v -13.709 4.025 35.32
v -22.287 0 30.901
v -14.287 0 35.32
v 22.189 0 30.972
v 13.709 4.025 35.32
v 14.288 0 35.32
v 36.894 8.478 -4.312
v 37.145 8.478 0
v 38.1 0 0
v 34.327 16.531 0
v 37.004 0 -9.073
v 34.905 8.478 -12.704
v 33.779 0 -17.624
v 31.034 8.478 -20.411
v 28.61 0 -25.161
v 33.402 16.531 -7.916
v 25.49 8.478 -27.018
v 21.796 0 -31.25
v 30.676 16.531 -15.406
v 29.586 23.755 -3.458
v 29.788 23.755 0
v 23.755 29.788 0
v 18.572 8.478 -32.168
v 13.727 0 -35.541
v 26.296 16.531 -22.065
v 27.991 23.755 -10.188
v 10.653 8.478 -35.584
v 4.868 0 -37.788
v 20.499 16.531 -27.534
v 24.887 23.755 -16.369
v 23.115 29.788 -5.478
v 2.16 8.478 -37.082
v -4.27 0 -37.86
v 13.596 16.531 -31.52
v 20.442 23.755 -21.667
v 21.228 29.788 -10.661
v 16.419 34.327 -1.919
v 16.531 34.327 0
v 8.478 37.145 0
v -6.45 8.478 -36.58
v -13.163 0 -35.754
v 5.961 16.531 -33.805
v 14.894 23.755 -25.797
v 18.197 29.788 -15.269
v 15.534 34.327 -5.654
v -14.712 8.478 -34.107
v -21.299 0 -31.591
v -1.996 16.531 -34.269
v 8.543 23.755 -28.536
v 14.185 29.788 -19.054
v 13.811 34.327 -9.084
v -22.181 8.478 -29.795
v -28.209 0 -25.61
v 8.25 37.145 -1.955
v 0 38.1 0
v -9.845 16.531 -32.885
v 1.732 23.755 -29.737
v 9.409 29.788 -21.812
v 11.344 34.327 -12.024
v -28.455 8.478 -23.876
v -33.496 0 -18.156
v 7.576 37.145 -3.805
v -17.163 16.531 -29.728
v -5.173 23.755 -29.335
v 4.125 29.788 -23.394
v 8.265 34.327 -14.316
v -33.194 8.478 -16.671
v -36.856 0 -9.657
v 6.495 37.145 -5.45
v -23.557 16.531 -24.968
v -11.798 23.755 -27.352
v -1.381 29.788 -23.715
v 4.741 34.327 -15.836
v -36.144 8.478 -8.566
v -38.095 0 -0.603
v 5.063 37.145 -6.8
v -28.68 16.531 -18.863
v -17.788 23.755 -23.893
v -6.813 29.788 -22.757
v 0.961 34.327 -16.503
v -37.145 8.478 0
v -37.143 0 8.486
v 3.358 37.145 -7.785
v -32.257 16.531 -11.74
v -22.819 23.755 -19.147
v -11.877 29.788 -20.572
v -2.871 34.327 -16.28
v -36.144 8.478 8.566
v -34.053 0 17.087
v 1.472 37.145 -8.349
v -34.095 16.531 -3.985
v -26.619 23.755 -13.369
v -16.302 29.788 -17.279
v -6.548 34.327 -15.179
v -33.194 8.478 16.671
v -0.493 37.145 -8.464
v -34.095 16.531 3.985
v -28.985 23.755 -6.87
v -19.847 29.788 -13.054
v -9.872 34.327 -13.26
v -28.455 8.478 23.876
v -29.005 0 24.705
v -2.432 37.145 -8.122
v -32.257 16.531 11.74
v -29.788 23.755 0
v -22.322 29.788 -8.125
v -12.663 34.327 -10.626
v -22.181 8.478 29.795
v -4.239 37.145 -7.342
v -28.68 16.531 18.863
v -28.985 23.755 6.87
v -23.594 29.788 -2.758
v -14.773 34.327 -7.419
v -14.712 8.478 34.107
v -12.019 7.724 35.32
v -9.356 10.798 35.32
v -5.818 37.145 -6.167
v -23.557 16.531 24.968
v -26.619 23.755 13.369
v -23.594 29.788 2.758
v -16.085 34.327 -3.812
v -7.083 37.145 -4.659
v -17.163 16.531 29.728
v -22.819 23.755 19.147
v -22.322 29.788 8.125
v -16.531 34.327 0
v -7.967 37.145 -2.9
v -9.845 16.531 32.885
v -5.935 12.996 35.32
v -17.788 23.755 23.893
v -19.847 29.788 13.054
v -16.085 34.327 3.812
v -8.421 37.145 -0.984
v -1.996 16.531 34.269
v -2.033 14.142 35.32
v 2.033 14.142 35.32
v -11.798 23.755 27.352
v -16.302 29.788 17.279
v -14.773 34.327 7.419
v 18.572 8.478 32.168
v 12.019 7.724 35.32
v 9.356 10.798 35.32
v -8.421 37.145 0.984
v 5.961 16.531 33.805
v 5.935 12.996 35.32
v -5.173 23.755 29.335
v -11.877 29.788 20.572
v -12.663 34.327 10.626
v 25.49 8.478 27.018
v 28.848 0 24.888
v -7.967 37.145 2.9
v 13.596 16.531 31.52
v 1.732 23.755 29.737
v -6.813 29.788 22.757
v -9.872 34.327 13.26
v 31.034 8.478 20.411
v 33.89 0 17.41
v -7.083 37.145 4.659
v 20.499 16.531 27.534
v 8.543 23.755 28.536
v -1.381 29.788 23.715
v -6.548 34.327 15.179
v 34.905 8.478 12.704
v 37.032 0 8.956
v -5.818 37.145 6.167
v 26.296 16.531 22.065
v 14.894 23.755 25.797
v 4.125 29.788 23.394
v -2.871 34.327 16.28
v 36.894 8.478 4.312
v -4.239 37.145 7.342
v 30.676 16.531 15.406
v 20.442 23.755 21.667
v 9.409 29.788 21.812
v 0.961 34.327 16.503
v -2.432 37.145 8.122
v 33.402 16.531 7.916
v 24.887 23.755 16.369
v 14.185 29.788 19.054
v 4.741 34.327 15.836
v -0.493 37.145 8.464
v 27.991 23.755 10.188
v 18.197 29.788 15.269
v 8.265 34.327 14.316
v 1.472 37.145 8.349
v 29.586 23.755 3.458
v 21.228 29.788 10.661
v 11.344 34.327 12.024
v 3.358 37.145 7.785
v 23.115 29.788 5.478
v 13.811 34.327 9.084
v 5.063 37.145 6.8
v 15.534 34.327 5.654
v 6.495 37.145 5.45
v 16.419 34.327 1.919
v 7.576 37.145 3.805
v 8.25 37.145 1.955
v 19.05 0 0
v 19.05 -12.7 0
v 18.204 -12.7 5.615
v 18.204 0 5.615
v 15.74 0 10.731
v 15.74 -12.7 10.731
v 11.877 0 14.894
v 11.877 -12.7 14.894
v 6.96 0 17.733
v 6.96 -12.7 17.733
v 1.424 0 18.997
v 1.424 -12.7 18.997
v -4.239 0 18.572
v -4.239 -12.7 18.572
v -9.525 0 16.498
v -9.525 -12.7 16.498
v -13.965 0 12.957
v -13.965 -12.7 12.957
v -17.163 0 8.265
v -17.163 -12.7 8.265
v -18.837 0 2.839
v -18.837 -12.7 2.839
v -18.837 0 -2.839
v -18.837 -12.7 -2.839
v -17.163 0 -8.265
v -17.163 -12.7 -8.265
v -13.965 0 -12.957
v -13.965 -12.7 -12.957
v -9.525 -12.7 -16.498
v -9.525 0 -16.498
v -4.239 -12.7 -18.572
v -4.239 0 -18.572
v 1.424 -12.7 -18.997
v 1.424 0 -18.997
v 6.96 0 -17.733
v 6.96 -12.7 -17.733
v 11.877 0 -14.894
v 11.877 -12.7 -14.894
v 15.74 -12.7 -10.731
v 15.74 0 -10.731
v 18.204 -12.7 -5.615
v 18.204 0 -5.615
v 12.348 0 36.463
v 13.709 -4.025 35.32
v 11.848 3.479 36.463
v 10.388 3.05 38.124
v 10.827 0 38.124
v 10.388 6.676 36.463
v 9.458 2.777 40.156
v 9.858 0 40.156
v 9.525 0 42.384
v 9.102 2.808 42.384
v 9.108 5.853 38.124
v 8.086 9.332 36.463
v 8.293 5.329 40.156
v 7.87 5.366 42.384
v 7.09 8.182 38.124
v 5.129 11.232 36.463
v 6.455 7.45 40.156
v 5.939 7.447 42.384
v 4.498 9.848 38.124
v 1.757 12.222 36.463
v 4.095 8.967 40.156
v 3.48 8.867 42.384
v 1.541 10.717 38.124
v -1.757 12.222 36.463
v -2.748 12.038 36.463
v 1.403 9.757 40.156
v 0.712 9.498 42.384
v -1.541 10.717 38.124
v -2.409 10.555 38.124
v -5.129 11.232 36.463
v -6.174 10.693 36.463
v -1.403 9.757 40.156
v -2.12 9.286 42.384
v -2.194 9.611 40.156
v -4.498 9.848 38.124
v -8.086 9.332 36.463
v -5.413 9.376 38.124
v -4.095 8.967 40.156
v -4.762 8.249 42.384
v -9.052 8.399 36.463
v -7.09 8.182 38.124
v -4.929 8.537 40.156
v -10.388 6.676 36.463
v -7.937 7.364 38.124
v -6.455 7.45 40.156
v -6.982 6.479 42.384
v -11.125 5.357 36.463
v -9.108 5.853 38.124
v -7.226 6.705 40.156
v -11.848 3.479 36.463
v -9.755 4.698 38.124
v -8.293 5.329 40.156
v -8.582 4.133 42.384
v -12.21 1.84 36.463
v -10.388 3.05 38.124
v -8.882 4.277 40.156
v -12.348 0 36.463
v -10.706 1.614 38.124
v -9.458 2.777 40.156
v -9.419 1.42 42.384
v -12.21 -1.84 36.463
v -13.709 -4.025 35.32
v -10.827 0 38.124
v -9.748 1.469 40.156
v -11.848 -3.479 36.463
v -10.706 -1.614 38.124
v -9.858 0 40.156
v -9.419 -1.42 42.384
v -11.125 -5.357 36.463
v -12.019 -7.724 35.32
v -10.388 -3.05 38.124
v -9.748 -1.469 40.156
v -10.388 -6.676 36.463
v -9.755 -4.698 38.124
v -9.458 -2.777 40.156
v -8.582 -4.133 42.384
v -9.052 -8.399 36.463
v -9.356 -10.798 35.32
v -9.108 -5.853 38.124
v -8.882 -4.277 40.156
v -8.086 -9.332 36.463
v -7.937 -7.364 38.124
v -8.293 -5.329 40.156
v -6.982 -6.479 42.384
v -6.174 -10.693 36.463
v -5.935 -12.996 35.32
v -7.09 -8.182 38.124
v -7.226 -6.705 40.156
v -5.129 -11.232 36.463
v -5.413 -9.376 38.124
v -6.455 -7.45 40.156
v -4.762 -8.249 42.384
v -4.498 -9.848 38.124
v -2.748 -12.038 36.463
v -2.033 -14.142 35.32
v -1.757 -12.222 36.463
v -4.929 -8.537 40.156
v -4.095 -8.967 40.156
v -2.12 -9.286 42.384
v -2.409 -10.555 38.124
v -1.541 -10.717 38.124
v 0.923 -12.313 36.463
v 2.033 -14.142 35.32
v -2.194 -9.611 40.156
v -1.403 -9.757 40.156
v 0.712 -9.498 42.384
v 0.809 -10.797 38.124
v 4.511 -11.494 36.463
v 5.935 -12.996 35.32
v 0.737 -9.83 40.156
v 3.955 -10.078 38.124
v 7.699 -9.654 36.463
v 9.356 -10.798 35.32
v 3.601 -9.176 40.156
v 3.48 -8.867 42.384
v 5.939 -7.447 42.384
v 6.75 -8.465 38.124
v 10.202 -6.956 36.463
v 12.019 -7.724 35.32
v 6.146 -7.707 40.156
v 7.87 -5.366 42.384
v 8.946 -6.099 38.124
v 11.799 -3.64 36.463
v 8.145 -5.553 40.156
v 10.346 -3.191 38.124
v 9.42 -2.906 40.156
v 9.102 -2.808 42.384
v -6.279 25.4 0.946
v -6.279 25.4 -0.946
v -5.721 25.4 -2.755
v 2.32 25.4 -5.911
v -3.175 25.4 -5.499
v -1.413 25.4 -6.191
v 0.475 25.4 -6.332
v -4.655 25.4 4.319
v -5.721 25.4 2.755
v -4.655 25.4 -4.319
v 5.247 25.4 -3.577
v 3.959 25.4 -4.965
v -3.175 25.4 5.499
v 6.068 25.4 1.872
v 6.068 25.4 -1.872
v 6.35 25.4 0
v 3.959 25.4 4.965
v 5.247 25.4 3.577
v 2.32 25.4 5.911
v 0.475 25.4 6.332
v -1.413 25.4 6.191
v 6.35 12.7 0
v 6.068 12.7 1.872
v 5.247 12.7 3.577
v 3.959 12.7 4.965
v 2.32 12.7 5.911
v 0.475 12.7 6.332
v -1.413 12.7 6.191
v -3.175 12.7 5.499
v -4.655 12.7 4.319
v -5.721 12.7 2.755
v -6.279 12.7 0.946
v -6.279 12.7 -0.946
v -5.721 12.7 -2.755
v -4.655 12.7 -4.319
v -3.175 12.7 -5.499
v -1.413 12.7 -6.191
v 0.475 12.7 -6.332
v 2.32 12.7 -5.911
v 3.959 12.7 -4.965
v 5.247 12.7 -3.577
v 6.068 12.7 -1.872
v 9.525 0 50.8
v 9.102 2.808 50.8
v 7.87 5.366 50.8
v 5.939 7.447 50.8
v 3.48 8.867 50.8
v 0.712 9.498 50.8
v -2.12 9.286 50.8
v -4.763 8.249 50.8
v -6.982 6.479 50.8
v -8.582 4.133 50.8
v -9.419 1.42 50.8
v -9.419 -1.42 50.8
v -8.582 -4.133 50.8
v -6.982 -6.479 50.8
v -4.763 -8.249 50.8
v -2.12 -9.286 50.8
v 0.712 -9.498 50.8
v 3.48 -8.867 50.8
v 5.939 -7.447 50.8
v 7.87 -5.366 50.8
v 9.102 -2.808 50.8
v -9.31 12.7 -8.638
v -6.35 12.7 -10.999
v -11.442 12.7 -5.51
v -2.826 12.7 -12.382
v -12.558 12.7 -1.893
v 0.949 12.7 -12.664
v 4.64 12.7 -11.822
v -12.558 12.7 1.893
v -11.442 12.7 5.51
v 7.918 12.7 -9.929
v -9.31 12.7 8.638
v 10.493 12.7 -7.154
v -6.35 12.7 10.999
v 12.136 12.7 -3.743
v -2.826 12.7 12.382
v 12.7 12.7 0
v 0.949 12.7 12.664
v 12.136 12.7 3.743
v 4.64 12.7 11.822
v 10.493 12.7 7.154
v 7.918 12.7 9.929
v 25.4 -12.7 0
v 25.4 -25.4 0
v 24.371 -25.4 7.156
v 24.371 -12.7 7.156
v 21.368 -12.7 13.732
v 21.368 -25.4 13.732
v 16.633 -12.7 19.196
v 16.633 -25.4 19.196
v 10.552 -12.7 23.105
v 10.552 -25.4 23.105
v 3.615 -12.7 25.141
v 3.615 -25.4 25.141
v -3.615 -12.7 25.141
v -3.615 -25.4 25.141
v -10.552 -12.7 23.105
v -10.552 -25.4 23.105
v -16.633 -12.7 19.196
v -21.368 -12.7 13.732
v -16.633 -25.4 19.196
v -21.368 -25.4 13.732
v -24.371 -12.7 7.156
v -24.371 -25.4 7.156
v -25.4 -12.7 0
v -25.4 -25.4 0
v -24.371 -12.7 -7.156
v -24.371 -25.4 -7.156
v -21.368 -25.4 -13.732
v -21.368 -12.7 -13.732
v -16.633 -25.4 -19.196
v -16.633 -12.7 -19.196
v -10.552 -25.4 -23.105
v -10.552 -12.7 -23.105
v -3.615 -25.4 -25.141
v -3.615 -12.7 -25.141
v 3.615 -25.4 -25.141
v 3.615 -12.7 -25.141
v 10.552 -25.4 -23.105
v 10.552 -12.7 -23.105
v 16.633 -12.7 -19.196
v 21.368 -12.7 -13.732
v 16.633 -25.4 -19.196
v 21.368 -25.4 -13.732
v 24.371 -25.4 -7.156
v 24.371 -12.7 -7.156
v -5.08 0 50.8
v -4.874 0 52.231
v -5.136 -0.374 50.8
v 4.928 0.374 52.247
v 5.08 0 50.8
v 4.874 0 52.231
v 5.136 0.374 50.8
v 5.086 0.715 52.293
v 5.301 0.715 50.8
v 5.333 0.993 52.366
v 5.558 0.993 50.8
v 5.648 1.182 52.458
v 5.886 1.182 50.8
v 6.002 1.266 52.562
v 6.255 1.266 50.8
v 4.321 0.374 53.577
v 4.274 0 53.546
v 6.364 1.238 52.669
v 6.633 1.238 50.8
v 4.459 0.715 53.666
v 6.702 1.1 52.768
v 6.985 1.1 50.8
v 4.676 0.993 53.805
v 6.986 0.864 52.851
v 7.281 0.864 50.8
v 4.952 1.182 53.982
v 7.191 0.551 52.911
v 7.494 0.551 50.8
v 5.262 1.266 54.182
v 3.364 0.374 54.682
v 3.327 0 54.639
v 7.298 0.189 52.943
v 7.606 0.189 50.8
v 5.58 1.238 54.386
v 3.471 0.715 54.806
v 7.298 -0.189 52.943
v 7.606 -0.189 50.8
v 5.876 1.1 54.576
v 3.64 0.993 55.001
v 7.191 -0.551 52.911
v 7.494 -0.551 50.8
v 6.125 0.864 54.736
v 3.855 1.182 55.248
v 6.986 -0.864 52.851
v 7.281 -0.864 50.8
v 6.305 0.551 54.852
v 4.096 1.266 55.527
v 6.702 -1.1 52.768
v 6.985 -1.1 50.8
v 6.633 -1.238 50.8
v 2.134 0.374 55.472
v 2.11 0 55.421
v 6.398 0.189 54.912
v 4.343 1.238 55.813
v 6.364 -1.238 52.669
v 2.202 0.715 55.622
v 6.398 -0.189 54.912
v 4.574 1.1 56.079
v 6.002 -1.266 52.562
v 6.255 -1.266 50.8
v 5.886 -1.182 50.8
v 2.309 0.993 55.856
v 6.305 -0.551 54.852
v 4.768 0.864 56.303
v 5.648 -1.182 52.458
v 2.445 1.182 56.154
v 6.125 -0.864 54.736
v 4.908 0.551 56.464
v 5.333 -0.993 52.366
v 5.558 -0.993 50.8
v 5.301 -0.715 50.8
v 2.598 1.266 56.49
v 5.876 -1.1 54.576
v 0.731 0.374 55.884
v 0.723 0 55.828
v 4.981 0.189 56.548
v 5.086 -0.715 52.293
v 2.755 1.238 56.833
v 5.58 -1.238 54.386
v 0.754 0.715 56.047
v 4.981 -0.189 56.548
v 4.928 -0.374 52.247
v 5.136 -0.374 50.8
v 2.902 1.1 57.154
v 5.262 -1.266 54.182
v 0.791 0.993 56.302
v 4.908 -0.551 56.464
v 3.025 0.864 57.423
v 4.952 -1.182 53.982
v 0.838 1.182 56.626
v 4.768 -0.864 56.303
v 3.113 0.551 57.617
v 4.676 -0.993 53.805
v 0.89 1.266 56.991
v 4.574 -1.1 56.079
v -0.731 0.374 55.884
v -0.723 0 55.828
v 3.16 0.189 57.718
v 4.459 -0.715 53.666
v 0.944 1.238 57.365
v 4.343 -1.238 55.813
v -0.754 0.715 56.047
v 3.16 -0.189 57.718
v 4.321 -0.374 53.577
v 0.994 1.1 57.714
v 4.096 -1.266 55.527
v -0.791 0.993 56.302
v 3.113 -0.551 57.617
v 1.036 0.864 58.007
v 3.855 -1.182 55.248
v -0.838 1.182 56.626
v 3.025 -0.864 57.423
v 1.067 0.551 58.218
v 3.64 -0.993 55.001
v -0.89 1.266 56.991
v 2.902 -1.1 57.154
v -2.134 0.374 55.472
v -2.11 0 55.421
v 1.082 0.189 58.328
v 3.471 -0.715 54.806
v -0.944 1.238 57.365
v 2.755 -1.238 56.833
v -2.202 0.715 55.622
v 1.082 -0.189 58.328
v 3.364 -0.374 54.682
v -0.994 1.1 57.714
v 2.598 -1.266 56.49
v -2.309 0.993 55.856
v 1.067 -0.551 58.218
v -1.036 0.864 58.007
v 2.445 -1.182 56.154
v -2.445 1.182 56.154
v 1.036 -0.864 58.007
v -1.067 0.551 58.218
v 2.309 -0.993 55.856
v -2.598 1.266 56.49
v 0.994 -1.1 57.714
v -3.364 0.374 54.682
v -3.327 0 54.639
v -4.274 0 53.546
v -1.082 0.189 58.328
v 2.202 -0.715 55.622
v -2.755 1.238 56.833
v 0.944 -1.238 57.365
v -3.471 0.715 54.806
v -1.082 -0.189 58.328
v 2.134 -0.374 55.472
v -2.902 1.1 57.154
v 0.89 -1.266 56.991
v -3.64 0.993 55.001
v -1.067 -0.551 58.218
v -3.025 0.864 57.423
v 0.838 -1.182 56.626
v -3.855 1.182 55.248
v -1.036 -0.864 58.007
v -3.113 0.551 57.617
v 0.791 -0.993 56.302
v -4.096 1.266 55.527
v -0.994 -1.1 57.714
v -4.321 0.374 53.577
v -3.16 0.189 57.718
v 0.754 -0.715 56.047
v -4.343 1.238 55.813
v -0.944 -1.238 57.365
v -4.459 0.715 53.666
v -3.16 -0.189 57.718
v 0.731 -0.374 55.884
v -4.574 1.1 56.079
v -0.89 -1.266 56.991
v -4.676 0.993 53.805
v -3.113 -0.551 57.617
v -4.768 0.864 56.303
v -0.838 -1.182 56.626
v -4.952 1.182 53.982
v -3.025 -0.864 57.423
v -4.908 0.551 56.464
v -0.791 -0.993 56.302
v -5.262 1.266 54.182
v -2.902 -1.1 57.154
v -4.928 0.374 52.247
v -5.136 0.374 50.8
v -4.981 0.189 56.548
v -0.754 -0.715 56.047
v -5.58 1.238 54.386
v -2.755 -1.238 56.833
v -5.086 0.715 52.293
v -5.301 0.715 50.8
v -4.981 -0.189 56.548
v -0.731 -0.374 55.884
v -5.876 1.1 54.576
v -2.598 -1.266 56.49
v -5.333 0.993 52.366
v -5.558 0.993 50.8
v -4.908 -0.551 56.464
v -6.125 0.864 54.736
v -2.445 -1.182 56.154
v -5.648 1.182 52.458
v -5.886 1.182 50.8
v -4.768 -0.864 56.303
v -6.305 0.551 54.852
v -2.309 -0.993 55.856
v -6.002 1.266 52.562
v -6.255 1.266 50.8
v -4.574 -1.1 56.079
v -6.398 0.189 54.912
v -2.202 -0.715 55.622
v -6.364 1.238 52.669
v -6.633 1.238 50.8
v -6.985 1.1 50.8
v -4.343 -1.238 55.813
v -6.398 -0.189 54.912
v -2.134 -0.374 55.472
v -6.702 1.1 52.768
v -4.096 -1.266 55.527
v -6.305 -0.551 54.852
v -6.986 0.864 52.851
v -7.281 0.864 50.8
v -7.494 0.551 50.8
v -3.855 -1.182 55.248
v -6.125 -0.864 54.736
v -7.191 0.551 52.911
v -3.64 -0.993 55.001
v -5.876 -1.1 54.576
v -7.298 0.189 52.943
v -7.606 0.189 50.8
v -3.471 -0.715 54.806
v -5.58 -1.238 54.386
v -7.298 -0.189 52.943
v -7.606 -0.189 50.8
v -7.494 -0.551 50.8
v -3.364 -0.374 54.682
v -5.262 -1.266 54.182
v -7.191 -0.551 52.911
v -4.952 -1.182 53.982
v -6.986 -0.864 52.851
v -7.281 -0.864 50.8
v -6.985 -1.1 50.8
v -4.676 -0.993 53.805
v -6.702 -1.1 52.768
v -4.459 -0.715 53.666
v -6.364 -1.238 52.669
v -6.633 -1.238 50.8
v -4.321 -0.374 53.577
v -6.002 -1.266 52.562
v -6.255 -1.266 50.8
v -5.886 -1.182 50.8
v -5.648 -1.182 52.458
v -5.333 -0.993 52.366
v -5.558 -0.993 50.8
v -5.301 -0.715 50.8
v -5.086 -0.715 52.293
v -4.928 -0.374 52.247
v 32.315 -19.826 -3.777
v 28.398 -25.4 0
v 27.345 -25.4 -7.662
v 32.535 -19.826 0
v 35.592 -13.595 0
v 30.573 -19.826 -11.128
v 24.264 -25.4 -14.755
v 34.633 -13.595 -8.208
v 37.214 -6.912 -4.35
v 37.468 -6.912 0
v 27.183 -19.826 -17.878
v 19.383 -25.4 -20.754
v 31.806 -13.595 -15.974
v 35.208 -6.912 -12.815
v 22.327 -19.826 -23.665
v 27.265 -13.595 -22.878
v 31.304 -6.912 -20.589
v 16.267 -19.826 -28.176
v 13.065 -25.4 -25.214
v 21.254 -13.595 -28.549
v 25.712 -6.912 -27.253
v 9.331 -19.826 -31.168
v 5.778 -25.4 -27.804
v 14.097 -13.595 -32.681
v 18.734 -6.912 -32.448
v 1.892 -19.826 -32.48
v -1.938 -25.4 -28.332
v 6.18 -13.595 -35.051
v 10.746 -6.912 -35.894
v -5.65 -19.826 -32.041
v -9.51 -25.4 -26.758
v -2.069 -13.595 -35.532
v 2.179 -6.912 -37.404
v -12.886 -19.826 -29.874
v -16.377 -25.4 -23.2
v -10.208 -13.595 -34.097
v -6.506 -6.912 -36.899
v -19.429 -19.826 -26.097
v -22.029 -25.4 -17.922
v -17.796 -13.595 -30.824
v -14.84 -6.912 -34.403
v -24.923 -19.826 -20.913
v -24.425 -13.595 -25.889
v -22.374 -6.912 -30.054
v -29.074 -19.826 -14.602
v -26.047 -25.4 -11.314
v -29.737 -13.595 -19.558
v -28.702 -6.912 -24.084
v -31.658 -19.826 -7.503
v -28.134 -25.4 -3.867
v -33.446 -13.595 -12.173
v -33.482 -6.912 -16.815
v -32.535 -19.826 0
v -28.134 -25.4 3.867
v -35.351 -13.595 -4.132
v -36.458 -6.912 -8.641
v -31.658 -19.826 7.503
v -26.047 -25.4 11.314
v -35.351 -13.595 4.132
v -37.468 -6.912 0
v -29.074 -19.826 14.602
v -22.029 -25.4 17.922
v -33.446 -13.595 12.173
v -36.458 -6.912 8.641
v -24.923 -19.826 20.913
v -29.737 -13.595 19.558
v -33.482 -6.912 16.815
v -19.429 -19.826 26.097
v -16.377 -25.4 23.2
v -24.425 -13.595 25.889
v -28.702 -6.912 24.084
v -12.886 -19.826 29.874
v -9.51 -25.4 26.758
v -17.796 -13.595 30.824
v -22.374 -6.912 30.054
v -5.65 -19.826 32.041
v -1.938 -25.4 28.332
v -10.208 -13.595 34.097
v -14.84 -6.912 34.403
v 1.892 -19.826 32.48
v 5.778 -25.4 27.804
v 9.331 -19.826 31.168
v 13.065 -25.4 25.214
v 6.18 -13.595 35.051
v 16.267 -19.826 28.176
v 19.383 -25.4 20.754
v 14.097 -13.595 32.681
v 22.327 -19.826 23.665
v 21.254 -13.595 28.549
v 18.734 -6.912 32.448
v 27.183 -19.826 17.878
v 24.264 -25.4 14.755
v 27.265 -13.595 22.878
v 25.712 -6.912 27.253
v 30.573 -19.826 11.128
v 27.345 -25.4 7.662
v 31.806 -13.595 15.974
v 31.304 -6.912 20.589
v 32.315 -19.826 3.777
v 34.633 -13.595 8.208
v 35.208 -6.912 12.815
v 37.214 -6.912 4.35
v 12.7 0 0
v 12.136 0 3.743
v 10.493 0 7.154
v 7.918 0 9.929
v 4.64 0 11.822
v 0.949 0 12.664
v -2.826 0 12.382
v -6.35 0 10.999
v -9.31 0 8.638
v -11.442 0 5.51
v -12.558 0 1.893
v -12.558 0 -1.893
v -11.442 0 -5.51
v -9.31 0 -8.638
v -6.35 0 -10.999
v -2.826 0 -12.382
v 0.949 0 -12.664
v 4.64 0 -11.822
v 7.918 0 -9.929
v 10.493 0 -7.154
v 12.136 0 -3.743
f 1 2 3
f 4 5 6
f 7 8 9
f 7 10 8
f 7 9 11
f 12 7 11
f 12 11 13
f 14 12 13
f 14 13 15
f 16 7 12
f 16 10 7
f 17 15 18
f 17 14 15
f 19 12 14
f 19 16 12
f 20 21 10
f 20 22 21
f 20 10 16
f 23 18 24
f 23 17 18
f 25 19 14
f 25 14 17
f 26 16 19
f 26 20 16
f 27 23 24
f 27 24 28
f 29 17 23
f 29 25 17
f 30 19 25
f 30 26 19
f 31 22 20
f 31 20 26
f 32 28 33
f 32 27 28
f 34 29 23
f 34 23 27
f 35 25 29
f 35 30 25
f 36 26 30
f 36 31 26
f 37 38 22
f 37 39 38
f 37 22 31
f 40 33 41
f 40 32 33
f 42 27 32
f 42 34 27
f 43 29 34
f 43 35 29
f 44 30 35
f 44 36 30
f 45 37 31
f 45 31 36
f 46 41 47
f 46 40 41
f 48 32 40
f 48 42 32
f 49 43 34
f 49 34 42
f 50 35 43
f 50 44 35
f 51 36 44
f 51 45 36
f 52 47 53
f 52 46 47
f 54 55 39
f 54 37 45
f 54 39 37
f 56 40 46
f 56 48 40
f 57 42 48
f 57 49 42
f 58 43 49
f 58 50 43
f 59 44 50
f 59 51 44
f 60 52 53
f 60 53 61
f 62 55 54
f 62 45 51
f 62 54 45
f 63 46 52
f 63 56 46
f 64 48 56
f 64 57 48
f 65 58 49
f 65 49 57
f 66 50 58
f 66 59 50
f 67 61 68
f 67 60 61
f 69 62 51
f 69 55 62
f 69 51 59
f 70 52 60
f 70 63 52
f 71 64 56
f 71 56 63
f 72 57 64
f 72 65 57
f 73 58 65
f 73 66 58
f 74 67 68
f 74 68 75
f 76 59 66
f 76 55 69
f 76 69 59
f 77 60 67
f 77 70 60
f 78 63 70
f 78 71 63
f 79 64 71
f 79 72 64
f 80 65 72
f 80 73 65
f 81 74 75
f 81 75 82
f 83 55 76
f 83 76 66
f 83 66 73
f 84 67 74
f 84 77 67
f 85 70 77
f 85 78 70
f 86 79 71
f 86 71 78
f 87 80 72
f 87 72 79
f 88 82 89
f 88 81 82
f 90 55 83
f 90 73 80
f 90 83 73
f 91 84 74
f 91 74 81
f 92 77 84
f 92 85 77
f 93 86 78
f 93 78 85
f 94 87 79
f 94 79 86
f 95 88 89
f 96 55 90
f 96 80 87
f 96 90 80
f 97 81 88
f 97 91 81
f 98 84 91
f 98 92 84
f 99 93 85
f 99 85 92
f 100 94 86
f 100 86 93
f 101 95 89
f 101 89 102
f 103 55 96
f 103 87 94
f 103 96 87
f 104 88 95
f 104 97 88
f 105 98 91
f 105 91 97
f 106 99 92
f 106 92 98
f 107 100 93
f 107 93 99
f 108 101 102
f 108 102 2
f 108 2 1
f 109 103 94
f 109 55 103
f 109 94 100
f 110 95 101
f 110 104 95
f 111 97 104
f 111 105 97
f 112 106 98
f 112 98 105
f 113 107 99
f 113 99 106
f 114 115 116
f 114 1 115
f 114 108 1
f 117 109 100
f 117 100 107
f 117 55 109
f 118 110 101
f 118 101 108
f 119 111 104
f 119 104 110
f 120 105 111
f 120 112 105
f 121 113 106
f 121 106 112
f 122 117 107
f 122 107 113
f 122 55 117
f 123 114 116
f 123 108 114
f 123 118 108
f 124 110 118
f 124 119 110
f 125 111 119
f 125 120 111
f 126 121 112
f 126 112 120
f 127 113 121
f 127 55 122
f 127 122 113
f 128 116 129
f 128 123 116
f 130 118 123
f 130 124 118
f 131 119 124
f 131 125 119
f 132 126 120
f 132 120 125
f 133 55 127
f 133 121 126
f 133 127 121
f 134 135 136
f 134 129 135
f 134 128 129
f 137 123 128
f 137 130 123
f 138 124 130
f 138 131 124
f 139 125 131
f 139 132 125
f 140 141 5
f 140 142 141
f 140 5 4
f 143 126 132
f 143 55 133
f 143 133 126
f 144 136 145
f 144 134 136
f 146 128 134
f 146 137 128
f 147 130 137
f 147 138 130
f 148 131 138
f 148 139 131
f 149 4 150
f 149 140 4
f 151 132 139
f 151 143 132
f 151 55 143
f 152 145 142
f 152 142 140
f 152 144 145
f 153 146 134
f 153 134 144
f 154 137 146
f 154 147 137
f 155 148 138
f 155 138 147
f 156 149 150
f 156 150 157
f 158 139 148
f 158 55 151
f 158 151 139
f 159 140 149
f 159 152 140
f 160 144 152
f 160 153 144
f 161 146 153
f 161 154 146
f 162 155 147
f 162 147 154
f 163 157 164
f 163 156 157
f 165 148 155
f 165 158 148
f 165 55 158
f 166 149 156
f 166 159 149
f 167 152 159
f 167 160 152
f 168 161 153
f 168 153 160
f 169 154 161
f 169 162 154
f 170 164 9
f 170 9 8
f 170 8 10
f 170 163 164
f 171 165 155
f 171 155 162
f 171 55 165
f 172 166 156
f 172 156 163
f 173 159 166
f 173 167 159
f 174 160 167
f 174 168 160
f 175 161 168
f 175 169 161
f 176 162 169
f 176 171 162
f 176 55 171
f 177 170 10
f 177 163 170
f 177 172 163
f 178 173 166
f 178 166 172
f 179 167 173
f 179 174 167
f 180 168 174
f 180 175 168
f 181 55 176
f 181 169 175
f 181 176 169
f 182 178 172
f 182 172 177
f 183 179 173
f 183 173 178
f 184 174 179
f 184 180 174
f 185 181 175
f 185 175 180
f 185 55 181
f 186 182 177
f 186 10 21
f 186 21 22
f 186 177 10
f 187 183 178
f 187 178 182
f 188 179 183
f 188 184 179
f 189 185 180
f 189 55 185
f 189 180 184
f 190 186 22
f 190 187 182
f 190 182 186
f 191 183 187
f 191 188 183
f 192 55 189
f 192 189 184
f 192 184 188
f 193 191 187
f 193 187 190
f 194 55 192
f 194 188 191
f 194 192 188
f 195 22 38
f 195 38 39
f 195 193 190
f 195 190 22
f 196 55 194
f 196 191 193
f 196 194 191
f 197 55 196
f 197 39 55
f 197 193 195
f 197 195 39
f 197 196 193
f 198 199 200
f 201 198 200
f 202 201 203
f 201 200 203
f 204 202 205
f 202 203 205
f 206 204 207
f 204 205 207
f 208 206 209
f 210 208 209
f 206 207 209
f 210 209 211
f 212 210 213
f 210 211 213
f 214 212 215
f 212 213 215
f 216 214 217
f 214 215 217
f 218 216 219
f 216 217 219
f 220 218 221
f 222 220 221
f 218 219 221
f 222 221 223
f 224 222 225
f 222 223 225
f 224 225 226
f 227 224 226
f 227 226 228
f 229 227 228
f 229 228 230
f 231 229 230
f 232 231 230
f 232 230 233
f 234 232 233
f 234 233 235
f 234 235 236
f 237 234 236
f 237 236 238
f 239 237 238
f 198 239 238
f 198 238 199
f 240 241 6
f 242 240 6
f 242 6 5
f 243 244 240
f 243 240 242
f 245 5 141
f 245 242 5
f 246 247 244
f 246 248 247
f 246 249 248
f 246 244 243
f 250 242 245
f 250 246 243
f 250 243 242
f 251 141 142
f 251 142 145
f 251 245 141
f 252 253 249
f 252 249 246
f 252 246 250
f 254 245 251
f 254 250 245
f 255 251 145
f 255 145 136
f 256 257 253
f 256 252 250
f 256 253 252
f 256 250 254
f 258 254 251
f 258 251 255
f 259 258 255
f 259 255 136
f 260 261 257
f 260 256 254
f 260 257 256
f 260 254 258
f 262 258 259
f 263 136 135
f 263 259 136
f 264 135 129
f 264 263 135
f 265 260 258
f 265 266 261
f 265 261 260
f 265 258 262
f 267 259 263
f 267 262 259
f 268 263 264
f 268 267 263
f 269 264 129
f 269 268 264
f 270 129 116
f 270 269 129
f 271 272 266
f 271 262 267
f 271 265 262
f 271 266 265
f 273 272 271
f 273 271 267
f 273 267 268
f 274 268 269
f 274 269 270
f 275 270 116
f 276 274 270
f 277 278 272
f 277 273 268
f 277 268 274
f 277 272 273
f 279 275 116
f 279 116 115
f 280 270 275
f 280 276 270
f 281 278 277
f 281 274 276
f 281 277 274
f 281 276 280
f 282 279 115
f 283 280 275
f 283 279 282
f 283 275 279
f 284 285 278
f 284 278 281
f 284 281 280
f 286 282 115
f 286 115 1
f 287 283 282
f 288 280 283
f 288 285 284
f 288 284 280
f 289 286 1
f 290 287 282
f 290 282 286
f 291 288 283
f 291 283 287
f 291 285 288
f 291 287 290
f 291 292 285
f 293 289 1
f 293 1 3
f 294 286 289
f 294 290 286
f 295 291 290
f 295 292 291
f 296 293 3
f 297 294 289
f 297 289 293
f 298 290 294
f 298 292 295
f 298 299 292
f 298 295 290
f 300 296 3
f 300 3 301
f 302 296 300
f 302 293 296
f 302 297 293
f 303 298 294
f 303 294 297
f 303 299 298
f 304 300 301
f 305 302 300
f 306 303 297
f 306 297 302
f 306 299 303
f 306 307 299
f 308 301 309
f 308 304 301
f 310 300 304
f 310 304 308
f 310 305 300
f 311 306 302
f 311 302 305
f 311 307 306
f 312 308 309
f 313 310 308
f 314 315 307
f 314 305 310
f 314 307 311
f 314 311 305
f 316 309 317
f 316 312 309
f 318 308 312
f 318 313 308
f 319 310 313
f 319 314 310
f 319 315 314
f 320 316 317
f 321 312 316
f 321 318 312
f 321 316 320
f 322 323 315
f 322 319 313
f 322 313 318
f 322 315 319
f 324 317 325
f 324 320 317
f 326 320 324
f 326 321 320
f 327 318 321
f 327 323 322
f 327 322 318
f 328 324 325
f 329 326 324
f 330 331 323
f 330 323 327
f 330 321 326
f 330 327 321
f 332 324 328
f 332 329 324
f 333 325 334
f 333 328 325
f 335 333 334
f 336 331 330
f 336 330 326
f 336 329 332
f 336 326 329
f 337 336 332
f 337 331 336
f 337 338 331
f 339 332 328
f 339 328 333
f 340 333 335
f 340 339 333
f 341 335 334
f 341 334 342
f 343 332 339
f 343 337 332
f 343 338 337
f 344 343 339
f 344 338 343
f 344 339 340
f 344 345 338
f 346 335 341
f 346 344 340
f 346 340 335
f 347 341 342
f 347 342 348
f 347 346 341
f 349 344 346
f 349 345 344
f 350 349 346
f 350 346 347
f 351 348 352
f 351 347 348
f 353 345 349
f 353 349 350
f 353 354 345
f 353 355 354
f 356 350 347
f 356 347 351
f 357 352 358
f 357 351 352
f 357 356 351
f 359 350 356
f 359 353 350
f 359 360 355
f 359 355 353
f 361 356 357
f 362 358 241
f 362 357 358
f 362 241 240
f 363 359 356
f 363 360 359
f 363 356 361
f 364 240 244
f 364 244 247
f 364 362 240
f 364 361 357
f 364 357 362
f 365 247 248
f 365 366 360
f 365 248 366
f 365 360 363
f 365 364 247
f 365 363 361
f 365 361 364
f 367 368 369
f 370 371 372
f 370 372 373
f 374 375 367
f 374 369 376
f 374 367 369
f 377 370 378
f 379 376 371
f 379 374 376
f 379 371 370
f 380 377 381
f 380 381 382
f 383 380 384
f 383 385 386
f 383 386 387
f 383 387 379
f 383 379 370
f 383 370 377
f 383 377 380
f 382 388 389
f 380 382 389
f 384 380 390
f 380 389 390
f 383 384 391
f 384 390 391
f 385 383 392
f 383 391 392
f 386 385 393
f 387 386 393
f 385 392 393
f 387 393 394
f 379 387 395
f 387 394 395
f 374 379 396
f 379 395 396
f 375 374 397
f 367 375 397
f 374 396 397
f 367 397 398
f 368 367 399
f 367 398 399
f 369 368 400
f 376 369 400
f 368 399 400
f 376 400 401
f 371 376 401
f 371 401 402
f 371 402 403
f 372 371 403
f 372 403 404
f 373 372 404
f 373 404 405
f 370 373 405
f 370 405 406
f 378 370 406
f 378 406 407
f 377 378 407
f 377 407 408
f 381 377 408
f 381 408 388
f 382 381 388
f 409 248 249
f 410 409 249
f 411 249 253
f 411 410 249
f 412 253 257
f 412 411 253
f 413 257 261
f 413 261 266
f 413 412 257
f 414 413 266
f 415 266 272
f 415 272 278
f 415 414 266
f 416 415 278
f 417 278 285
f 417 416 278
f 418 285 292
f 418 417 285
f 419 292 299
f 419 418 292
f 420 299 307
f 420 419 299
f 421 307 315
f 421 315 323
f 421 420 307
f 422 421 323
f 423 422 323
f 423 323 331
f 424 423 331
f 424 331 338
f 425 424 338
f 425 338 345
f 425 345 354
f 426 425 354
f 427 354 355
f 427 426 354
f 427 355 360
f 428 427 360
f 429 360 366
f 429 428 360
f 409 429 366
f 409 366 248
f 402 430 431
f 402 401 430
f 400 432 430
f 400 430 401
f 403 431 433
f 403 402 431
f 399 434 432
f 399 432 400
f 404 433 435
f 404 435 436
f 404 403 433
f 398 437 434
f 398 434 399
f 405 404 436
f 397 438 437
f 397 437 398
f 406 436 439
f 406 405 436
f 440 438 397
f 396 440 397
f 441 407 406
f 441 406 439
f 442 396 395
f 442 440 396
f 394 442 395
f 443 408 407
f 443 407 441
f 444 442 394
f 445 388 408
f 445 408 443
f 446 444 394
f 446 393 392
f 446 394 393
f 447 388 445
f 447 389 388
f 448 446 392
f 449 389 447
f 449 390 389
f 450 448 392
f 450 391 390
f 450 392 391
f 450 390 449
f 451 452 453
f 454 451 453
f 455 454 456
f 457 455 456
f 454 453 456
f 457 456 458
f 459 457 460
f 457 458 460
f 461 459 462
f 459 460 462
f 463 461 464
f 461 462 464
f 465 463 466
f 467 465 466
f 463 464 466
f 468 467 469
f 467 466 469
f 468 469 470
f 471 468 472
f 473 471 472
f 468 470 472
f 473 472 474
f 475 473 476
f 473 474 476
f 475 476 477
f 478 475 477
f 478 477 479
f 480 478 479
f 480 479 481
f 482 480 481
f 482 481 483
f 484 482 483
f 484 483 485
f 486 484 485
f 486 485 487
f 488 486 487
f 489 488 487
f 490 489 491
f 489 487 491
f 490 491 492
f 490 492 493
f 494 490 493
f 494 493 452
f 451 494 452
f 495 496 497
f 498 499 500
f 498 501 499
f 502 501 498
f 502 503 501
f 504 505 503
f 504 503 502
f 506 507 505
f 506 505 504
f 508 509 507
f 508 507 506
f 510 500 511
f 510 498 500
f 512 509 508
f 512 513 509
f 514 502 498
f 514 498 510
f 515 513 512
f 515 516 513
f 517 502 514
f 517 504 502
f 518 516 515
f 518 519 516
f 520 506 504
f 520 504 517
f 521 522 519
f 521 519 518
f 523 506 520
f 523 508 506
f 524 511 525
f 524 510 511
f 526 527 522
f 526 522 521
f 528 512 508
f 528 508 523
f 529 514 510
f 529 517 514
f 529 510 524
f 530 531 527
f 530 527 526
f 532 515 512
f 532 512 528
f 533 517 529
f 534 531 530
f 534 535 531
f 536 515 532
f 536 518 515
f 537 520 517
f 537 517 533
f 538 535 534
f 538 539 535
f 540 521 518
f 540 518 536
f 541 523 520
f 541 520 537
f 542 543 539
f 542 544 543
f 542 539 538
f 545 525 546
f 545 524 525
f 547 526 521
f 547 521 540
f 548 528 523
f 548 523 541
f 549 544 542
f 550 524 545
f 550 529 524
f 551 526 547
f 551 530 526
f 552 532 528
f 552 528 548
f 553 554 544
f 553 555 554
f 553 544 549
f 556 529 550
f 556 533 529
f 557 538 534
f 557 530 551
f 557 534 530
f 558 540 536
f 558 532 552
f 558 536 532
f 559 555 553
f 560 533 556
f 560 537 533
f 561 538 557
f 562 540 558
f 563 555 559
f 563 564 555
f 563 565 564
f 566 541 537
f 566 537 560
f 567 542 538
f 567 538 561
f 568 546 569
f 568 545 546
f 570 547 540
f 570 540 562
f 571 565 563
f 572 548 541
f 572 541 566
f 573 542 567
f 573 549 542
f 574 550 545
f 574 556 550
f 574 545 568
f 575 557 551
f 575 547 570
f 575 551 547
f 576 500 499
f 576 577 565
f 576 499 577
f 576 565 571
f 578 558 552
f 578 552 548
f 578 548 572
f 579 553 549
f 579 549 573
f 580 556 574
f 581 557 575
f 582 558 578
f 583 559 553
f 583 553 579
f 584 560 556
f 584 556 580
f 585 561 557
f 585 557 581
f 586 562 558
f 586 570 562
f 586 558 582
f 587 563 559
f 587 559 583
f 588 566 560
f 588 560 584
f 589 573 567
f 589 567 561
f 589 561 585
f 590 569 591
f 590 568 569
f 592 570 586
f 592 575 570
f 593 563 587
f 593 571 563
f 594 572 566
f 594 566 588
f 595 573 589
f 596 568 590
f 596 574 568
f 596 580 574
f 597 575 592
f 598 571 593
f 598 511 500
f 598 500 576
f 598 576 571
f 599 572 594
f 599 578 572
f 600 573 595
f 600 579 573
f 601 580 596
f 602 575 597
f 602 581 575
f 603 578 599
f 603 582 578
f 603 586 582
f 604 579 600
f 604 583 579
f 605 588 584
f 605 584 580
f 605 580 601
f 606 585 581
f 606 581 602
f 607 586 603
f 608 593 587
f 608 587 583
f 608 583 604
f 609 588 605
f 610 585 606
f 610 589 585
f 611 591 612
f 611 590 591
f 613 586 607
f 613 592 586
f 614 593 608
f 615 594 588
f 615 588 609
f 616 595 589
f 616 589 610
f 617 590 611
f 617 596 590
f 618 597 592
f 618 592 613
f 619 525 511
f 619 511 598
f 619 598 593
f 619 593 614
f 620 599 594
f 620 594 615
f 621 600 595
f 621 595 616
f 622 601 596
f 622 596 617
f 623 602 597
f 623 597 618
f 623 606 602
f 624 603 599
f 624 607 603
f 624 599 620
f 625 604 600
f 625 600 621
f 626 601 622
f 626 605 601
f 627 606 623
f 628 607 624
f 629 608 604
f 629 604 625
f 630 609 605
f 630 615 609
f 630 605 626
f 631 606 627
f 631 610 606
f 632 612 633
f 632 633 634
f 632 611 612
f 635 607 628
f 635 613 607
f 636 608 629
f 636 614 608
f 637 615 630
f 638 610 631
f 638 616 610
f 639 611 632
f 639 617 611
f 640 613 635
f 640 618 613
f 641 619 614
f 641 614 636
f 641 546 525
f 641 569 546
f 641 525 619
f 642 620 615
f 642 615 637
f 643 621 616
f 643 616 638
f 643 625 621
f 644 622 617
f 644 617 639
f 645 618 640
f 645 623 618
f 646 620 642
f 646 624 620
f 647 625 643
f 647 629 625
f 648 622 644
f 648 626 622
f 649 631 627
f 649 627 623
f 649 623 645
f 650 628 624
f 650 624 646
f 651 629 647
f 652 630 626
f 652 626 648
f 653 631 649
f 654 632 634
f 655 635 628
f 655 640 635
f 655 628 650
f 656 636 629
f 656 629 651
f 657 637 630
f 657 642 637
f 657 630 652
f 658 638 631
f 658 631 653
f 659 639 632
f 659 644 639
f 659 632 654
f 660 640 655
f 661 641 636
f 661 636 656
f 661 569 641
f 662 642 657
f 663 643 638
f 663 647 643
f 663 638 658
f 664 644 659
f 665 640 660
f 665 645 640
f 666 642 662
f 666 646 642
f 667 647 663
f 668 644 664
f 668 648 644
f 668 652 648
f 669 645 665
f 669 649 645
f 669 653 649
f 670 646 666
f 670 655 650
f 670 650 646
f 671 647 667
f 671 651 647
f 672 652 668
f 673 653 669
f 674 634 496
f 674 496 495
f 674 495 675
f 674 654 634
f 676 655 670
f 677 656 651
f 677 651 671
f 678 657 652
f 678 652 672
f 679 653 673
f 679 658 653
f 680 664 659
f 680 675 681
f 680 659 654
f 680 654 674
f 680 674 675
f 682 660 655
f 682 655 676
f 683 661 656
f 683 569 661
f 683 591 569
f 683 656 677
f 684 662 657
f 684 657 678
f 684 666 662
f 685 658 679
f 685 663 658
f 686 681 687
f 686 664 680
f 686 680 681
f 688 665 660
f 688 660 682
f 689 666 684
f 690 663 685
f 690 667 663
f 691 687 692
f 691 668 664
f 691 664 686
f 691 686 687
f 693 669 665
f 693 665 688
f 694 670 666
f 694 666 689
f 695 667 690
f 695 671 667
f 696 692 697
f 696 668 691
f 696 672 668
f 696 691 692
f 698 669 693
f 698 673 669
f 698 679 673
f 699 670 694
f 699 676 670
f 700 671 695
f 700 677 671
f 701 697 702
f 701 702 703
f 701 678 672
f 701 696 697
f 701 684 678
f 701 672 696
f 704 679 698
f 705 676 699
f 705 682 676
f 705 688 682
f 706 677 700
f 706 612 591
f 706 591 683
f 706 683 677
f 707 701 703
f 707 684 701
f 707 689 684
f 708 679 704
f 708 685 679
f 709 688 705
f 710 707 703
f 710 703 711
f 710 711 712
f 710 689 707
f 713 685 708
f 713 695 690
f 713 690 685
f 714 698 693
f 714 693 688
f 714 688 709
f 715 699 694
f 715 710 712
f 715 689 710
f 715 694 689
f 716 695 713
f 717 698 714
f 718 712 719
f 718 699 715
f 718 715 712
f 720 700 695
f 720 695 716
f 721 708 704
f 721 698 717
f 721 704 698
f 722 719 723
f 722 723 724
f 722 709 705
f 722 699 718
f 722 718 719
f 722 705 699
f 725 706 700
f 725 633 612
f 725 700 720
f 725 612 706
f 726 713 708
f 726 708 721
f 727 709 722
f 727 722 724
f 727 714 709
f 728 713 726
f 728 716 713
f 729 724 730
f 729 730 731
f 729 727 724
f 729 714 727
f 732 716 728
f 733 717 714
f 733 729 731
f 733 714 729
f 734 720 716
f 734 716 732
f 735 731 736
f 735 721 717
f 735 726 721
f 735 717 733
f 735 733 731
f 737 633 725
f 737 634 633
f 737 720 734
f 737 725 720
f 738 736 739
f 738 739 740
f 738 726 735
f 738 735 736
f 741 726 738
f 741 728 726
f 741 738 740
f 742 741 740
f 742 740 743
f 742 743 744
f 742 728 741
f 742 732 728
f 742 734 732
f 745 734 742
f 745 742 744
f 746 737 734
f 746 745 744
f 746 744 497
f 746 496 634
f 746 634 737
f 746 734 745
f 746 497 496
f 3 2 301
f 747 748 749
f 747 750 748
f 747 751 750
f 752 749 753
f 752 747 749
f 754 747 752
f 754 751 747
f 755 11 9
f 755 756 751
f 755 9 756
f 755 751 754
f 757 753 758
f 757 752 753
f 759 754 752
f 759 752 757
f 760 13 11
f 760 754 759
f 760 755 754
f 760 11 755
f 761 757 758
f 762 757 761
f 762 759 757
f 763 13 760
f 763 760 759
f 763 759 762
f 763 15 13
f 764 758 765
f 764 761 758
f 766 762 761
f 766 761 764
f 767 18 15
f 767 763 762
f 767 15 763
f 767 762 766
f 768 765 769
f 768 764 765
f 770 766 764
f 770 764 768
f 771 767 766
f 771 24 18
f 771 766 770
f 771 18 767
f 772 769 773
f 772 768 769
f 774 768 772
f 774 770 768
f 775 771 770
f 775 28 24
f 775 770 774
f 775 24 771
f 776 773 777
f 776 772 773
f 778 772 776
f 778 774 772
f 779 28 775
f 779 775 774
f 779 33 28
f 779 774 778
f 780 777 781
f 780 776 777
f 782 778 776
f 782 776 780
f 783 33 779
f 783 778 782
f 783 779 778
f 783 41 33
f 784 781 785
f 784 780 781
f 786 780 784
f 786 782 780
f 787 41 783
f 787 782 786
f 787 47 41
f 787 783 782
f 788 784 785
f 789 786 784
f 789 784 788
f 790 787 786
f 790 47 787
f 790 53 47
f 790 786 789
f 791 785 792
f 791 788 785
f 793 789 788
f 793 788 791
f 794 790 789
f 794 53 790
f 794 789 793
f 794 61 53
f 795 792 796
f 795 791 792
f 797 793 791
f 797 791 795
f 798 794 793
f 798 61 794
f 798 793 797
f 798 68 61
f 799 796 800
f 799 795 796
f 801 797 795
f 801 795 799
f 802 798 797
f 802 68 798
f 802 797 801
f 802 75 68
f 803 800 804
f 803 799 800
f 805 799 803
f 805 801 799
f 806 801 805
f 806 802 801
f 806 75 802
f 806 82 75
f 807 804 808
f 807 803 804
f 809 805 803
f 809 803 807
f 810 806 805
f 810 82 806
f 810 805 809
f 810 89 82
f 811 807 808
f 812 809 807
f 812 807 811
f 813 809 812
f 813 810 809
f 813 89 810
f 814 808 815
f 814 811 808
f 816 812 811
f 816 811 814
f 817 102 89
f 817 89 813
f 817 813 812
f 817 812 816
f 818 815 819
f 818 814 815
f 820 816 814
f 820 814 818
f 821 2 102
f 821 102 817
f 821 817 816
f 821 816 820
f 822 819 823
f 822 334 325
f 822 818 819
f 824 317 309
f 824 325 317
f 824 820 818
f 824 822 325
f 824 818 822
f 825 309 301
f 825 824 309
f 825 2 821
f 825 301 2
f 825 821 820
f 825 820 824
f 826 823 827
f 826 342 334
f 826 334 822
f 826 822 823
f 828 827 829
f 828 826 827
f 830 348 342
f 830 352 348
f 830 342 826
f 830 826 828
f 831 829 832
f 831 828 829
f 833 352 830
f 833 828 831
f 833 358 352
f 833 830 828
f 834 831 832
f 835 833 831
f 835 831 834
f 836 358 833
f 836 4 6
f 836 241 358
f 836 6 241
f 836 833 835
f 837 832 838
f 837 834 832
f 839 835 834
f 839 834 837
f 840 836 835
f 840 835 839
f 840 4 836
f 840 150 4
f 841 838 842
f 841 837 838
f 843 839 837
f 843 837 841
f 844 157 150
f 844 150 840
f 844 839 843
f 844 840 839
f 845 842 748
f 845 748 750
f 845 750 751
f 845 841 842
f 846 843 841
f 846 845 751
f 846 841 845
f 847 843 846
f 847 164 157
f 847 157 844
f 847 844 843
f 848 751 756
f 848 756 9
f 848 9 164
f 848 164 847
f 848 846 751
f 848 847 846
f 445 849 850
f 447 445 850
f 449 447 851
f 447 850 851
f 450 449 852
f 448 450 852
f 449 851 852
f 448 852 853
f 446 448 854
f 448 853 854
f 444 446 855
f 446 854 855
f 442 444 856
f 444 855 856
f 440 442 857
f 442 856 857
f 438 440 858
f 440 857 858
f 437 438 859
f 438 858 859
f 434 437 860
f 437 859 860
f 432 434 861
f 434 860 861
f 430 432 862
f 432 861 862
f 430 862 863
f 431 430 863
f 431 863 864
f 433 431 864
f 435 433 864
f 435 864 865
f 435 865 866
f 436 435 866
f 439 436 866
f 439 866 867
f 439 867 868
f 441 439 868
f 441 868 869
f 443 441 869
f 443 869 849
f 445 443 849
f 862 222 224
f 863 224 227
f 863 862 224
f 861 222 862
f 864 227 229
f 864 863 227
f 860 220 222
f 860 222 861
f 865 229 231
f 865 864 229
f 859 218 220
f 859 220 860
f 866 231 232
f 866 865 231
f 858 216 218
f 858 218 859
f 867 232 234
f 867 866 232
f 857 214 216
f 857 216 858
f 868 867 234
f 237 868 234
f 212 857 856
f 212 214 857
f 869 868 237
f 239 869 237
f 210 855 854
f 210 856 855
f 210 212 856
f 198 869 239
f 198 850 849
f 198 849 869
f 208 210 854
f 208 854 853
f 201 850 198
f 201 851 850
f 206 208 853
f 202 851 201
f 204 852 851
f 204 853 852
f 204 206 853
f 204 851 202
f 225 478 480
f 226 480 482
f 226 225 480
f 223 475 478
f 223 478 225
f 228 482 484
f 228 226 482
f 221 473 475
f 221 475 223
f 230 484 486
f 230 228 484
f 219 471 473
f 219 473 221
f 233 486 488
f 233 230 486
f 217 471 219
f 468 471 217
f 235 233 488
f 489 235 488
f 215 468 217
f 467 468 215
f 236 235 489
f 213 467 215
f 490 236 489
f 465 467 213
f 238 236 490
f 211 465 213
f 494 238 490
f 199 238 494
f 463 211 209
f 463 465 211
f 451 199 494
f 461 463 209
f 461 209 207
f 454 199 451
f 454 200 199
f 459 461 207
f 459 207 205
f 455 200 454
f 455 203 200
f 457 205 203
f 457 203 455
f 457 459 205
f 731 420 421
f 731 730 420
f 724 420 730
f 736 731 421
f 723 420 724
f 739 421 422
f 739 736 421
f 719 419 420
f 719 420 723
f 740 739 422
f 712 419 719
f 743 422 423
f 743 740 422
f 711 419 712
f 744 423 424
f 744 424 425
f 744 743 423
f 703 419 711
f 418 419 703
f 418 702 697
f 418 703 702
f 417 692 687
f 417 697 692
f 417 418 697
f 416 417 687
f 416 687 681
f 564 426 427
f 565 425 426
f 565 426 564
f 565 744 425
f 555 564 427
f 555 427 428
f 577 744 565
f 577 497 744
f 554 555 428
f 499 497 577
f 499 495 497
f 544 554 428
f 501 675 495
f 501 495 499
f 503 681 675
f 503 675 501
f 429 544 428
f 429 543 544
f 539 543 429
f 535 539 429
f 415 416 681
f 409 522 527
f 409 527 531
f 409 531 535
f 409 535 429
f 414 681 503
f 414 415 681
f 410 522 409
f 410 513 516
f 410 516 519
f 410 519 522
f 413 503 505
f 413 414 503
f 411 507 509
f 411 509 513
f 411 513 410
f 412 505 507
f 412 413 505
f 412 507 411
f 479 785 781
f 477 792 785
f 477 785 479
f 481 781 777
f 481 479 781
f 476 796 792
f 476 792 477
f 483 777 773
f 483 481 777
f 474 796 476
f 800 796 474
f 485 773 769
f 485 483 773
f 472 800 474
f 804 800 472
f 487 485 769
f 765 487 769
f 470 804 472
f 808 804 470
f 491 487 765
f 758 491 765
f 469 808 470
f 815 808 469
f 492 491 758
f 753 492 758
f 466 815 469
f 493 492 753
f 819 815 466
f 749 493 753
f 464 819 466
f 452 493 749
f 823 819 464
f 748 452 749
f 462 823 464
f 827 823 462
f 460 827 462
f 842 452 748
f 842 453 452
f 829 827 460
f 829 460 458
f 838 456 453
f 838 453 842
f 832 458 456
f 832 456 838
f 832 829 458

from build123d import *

# Parameters (mm, degrees)
F3_R      = 6.35
F4_DEPTH  = 63.5
F3_R_2    = 12.7
F5_DEPTH  = 50.8
F3_R_3    = 19.05
F6_DEPTH  = 38.1
F3_R_4    = 25.4
F7_DEPTH  = 25.4
F3_R_5    = 31.75
F8_DEPTH  = 12.7
F10_R     = 9.525
F11_DEPTH = 12.7
F14_R     = 1.27


# Not quite as in the source:
# - a fillet or chamfer that OpenCascade refuses, or shapes differently, is made with other operations: its cross-section is extruded or revolved along the edge and cut away or added


with BuildPart() as f1:
    # F0 (on Top) → F1 (revolve)
    with BuildSketch(Plane.XY):
        with BuildLine():
            ThreePointArc((0, -38.1), (26.9407683632, -26.9407683632), (38.1, 0))
            ThreePointArc((38.1, 0), (26.9407683632, 26.9407683632), (0, 38.1))
            Line((0, 38.1), (0, -38.1))
        make_face()
    revolve(axis=Axis((0, 0, 0), (0, 1, 0)))

    # F3 (on offset) → F4 (cut)
    with BuildSketch(Plane.XZ.offset(38.1)):
        Circle(F3_R)
    extrude(amount=-F4_DEPTH, mode=Mode.SUBTRACT)

    # F3 (on offset) → F5 (cut)
    with BuildSketch(Plane.XZ.offset(38.1)):
        Circle(F3_R_2)
        Circle(F3_R, mode=Mode.SUBTRACT)
    extrude(amount=-F5_DEPTH, mode=Mode.SUBTRACT)

    # F3 (on offset) → F6 (cut)
    with BuildSketch(Plane.XZ.offset(38.1)):
        Circle(F3_R_3)
        Circle(F3_R_2, mode=Mode.SUBTRACT)
    extrude(amount=-F6_DEPTH, mode=Mode.SUBTRACT)

    # F3 (on offset) → F7 (cut)
    with BuildSketch(Plane.XZ.offset(38.1)):
        Circle(F3_R_4)
        Circle(F3_R_3, mode=Mode.SUBTRACT)
    extrude(amount=-F7_DEPTH, mode=Mode.SUBTRACT)

    # F3 (on offset) → F8 (cut)
    with BuildSketch(Plane.XZ.offset(38.1)):
        Circle(F3_R_5)
        Circle(F3_R_4, mode=Mode.SUBTRACT)
    extrude(amount=-F8_DEPTH, mode=Mode.SUBTRACT)

    # F10 (on offset) → F11 (join, symmetric)
    with BuildSketch(Plane.XY.offset(38.1)):
        Circle(F10_R)
    extrude(amount=F11_DEPTH, both=True)

    # F12: fillet of radius 7.62 on 1 edges, made by hand

    # F12_s1 → F12_t2 (revolve)
    with BuildSketch(Plane.XZ):
        with BuildLine():
            ThreePointArc((14.2875000004, 35.3196452948), (10.8268297748, 38.1238648566), (9.5250000004, 42.3835743538))
            Line((9.5250000004, 42.3835743538), (9.525, 36.8901663726))
            ThreePointArc((9.525, 36.8901663726), (11.9321172967, 36.1833466781), (14.2875000004, 35.3196452948))
        make_face()
    revolve(axis=Axis((2e-10, 0, 36.8901663726), (0, 0, 1)))

    # F15: sweep along a path in F13
    with BuildLine(Plane.XZ) as f15_path:
        ThreePointArc((6.35, 50.8), (0, 57.15), (-6.35, 50.8))
    # F14 (on face) → F15 (sweep)
    with BuildSketch(Plane.XY.offset(50.8)):
        with Locations((-6.35, 0)):
            Circle(F14_R)
    sweep(path=f15_path.line)


solid = f1.part
